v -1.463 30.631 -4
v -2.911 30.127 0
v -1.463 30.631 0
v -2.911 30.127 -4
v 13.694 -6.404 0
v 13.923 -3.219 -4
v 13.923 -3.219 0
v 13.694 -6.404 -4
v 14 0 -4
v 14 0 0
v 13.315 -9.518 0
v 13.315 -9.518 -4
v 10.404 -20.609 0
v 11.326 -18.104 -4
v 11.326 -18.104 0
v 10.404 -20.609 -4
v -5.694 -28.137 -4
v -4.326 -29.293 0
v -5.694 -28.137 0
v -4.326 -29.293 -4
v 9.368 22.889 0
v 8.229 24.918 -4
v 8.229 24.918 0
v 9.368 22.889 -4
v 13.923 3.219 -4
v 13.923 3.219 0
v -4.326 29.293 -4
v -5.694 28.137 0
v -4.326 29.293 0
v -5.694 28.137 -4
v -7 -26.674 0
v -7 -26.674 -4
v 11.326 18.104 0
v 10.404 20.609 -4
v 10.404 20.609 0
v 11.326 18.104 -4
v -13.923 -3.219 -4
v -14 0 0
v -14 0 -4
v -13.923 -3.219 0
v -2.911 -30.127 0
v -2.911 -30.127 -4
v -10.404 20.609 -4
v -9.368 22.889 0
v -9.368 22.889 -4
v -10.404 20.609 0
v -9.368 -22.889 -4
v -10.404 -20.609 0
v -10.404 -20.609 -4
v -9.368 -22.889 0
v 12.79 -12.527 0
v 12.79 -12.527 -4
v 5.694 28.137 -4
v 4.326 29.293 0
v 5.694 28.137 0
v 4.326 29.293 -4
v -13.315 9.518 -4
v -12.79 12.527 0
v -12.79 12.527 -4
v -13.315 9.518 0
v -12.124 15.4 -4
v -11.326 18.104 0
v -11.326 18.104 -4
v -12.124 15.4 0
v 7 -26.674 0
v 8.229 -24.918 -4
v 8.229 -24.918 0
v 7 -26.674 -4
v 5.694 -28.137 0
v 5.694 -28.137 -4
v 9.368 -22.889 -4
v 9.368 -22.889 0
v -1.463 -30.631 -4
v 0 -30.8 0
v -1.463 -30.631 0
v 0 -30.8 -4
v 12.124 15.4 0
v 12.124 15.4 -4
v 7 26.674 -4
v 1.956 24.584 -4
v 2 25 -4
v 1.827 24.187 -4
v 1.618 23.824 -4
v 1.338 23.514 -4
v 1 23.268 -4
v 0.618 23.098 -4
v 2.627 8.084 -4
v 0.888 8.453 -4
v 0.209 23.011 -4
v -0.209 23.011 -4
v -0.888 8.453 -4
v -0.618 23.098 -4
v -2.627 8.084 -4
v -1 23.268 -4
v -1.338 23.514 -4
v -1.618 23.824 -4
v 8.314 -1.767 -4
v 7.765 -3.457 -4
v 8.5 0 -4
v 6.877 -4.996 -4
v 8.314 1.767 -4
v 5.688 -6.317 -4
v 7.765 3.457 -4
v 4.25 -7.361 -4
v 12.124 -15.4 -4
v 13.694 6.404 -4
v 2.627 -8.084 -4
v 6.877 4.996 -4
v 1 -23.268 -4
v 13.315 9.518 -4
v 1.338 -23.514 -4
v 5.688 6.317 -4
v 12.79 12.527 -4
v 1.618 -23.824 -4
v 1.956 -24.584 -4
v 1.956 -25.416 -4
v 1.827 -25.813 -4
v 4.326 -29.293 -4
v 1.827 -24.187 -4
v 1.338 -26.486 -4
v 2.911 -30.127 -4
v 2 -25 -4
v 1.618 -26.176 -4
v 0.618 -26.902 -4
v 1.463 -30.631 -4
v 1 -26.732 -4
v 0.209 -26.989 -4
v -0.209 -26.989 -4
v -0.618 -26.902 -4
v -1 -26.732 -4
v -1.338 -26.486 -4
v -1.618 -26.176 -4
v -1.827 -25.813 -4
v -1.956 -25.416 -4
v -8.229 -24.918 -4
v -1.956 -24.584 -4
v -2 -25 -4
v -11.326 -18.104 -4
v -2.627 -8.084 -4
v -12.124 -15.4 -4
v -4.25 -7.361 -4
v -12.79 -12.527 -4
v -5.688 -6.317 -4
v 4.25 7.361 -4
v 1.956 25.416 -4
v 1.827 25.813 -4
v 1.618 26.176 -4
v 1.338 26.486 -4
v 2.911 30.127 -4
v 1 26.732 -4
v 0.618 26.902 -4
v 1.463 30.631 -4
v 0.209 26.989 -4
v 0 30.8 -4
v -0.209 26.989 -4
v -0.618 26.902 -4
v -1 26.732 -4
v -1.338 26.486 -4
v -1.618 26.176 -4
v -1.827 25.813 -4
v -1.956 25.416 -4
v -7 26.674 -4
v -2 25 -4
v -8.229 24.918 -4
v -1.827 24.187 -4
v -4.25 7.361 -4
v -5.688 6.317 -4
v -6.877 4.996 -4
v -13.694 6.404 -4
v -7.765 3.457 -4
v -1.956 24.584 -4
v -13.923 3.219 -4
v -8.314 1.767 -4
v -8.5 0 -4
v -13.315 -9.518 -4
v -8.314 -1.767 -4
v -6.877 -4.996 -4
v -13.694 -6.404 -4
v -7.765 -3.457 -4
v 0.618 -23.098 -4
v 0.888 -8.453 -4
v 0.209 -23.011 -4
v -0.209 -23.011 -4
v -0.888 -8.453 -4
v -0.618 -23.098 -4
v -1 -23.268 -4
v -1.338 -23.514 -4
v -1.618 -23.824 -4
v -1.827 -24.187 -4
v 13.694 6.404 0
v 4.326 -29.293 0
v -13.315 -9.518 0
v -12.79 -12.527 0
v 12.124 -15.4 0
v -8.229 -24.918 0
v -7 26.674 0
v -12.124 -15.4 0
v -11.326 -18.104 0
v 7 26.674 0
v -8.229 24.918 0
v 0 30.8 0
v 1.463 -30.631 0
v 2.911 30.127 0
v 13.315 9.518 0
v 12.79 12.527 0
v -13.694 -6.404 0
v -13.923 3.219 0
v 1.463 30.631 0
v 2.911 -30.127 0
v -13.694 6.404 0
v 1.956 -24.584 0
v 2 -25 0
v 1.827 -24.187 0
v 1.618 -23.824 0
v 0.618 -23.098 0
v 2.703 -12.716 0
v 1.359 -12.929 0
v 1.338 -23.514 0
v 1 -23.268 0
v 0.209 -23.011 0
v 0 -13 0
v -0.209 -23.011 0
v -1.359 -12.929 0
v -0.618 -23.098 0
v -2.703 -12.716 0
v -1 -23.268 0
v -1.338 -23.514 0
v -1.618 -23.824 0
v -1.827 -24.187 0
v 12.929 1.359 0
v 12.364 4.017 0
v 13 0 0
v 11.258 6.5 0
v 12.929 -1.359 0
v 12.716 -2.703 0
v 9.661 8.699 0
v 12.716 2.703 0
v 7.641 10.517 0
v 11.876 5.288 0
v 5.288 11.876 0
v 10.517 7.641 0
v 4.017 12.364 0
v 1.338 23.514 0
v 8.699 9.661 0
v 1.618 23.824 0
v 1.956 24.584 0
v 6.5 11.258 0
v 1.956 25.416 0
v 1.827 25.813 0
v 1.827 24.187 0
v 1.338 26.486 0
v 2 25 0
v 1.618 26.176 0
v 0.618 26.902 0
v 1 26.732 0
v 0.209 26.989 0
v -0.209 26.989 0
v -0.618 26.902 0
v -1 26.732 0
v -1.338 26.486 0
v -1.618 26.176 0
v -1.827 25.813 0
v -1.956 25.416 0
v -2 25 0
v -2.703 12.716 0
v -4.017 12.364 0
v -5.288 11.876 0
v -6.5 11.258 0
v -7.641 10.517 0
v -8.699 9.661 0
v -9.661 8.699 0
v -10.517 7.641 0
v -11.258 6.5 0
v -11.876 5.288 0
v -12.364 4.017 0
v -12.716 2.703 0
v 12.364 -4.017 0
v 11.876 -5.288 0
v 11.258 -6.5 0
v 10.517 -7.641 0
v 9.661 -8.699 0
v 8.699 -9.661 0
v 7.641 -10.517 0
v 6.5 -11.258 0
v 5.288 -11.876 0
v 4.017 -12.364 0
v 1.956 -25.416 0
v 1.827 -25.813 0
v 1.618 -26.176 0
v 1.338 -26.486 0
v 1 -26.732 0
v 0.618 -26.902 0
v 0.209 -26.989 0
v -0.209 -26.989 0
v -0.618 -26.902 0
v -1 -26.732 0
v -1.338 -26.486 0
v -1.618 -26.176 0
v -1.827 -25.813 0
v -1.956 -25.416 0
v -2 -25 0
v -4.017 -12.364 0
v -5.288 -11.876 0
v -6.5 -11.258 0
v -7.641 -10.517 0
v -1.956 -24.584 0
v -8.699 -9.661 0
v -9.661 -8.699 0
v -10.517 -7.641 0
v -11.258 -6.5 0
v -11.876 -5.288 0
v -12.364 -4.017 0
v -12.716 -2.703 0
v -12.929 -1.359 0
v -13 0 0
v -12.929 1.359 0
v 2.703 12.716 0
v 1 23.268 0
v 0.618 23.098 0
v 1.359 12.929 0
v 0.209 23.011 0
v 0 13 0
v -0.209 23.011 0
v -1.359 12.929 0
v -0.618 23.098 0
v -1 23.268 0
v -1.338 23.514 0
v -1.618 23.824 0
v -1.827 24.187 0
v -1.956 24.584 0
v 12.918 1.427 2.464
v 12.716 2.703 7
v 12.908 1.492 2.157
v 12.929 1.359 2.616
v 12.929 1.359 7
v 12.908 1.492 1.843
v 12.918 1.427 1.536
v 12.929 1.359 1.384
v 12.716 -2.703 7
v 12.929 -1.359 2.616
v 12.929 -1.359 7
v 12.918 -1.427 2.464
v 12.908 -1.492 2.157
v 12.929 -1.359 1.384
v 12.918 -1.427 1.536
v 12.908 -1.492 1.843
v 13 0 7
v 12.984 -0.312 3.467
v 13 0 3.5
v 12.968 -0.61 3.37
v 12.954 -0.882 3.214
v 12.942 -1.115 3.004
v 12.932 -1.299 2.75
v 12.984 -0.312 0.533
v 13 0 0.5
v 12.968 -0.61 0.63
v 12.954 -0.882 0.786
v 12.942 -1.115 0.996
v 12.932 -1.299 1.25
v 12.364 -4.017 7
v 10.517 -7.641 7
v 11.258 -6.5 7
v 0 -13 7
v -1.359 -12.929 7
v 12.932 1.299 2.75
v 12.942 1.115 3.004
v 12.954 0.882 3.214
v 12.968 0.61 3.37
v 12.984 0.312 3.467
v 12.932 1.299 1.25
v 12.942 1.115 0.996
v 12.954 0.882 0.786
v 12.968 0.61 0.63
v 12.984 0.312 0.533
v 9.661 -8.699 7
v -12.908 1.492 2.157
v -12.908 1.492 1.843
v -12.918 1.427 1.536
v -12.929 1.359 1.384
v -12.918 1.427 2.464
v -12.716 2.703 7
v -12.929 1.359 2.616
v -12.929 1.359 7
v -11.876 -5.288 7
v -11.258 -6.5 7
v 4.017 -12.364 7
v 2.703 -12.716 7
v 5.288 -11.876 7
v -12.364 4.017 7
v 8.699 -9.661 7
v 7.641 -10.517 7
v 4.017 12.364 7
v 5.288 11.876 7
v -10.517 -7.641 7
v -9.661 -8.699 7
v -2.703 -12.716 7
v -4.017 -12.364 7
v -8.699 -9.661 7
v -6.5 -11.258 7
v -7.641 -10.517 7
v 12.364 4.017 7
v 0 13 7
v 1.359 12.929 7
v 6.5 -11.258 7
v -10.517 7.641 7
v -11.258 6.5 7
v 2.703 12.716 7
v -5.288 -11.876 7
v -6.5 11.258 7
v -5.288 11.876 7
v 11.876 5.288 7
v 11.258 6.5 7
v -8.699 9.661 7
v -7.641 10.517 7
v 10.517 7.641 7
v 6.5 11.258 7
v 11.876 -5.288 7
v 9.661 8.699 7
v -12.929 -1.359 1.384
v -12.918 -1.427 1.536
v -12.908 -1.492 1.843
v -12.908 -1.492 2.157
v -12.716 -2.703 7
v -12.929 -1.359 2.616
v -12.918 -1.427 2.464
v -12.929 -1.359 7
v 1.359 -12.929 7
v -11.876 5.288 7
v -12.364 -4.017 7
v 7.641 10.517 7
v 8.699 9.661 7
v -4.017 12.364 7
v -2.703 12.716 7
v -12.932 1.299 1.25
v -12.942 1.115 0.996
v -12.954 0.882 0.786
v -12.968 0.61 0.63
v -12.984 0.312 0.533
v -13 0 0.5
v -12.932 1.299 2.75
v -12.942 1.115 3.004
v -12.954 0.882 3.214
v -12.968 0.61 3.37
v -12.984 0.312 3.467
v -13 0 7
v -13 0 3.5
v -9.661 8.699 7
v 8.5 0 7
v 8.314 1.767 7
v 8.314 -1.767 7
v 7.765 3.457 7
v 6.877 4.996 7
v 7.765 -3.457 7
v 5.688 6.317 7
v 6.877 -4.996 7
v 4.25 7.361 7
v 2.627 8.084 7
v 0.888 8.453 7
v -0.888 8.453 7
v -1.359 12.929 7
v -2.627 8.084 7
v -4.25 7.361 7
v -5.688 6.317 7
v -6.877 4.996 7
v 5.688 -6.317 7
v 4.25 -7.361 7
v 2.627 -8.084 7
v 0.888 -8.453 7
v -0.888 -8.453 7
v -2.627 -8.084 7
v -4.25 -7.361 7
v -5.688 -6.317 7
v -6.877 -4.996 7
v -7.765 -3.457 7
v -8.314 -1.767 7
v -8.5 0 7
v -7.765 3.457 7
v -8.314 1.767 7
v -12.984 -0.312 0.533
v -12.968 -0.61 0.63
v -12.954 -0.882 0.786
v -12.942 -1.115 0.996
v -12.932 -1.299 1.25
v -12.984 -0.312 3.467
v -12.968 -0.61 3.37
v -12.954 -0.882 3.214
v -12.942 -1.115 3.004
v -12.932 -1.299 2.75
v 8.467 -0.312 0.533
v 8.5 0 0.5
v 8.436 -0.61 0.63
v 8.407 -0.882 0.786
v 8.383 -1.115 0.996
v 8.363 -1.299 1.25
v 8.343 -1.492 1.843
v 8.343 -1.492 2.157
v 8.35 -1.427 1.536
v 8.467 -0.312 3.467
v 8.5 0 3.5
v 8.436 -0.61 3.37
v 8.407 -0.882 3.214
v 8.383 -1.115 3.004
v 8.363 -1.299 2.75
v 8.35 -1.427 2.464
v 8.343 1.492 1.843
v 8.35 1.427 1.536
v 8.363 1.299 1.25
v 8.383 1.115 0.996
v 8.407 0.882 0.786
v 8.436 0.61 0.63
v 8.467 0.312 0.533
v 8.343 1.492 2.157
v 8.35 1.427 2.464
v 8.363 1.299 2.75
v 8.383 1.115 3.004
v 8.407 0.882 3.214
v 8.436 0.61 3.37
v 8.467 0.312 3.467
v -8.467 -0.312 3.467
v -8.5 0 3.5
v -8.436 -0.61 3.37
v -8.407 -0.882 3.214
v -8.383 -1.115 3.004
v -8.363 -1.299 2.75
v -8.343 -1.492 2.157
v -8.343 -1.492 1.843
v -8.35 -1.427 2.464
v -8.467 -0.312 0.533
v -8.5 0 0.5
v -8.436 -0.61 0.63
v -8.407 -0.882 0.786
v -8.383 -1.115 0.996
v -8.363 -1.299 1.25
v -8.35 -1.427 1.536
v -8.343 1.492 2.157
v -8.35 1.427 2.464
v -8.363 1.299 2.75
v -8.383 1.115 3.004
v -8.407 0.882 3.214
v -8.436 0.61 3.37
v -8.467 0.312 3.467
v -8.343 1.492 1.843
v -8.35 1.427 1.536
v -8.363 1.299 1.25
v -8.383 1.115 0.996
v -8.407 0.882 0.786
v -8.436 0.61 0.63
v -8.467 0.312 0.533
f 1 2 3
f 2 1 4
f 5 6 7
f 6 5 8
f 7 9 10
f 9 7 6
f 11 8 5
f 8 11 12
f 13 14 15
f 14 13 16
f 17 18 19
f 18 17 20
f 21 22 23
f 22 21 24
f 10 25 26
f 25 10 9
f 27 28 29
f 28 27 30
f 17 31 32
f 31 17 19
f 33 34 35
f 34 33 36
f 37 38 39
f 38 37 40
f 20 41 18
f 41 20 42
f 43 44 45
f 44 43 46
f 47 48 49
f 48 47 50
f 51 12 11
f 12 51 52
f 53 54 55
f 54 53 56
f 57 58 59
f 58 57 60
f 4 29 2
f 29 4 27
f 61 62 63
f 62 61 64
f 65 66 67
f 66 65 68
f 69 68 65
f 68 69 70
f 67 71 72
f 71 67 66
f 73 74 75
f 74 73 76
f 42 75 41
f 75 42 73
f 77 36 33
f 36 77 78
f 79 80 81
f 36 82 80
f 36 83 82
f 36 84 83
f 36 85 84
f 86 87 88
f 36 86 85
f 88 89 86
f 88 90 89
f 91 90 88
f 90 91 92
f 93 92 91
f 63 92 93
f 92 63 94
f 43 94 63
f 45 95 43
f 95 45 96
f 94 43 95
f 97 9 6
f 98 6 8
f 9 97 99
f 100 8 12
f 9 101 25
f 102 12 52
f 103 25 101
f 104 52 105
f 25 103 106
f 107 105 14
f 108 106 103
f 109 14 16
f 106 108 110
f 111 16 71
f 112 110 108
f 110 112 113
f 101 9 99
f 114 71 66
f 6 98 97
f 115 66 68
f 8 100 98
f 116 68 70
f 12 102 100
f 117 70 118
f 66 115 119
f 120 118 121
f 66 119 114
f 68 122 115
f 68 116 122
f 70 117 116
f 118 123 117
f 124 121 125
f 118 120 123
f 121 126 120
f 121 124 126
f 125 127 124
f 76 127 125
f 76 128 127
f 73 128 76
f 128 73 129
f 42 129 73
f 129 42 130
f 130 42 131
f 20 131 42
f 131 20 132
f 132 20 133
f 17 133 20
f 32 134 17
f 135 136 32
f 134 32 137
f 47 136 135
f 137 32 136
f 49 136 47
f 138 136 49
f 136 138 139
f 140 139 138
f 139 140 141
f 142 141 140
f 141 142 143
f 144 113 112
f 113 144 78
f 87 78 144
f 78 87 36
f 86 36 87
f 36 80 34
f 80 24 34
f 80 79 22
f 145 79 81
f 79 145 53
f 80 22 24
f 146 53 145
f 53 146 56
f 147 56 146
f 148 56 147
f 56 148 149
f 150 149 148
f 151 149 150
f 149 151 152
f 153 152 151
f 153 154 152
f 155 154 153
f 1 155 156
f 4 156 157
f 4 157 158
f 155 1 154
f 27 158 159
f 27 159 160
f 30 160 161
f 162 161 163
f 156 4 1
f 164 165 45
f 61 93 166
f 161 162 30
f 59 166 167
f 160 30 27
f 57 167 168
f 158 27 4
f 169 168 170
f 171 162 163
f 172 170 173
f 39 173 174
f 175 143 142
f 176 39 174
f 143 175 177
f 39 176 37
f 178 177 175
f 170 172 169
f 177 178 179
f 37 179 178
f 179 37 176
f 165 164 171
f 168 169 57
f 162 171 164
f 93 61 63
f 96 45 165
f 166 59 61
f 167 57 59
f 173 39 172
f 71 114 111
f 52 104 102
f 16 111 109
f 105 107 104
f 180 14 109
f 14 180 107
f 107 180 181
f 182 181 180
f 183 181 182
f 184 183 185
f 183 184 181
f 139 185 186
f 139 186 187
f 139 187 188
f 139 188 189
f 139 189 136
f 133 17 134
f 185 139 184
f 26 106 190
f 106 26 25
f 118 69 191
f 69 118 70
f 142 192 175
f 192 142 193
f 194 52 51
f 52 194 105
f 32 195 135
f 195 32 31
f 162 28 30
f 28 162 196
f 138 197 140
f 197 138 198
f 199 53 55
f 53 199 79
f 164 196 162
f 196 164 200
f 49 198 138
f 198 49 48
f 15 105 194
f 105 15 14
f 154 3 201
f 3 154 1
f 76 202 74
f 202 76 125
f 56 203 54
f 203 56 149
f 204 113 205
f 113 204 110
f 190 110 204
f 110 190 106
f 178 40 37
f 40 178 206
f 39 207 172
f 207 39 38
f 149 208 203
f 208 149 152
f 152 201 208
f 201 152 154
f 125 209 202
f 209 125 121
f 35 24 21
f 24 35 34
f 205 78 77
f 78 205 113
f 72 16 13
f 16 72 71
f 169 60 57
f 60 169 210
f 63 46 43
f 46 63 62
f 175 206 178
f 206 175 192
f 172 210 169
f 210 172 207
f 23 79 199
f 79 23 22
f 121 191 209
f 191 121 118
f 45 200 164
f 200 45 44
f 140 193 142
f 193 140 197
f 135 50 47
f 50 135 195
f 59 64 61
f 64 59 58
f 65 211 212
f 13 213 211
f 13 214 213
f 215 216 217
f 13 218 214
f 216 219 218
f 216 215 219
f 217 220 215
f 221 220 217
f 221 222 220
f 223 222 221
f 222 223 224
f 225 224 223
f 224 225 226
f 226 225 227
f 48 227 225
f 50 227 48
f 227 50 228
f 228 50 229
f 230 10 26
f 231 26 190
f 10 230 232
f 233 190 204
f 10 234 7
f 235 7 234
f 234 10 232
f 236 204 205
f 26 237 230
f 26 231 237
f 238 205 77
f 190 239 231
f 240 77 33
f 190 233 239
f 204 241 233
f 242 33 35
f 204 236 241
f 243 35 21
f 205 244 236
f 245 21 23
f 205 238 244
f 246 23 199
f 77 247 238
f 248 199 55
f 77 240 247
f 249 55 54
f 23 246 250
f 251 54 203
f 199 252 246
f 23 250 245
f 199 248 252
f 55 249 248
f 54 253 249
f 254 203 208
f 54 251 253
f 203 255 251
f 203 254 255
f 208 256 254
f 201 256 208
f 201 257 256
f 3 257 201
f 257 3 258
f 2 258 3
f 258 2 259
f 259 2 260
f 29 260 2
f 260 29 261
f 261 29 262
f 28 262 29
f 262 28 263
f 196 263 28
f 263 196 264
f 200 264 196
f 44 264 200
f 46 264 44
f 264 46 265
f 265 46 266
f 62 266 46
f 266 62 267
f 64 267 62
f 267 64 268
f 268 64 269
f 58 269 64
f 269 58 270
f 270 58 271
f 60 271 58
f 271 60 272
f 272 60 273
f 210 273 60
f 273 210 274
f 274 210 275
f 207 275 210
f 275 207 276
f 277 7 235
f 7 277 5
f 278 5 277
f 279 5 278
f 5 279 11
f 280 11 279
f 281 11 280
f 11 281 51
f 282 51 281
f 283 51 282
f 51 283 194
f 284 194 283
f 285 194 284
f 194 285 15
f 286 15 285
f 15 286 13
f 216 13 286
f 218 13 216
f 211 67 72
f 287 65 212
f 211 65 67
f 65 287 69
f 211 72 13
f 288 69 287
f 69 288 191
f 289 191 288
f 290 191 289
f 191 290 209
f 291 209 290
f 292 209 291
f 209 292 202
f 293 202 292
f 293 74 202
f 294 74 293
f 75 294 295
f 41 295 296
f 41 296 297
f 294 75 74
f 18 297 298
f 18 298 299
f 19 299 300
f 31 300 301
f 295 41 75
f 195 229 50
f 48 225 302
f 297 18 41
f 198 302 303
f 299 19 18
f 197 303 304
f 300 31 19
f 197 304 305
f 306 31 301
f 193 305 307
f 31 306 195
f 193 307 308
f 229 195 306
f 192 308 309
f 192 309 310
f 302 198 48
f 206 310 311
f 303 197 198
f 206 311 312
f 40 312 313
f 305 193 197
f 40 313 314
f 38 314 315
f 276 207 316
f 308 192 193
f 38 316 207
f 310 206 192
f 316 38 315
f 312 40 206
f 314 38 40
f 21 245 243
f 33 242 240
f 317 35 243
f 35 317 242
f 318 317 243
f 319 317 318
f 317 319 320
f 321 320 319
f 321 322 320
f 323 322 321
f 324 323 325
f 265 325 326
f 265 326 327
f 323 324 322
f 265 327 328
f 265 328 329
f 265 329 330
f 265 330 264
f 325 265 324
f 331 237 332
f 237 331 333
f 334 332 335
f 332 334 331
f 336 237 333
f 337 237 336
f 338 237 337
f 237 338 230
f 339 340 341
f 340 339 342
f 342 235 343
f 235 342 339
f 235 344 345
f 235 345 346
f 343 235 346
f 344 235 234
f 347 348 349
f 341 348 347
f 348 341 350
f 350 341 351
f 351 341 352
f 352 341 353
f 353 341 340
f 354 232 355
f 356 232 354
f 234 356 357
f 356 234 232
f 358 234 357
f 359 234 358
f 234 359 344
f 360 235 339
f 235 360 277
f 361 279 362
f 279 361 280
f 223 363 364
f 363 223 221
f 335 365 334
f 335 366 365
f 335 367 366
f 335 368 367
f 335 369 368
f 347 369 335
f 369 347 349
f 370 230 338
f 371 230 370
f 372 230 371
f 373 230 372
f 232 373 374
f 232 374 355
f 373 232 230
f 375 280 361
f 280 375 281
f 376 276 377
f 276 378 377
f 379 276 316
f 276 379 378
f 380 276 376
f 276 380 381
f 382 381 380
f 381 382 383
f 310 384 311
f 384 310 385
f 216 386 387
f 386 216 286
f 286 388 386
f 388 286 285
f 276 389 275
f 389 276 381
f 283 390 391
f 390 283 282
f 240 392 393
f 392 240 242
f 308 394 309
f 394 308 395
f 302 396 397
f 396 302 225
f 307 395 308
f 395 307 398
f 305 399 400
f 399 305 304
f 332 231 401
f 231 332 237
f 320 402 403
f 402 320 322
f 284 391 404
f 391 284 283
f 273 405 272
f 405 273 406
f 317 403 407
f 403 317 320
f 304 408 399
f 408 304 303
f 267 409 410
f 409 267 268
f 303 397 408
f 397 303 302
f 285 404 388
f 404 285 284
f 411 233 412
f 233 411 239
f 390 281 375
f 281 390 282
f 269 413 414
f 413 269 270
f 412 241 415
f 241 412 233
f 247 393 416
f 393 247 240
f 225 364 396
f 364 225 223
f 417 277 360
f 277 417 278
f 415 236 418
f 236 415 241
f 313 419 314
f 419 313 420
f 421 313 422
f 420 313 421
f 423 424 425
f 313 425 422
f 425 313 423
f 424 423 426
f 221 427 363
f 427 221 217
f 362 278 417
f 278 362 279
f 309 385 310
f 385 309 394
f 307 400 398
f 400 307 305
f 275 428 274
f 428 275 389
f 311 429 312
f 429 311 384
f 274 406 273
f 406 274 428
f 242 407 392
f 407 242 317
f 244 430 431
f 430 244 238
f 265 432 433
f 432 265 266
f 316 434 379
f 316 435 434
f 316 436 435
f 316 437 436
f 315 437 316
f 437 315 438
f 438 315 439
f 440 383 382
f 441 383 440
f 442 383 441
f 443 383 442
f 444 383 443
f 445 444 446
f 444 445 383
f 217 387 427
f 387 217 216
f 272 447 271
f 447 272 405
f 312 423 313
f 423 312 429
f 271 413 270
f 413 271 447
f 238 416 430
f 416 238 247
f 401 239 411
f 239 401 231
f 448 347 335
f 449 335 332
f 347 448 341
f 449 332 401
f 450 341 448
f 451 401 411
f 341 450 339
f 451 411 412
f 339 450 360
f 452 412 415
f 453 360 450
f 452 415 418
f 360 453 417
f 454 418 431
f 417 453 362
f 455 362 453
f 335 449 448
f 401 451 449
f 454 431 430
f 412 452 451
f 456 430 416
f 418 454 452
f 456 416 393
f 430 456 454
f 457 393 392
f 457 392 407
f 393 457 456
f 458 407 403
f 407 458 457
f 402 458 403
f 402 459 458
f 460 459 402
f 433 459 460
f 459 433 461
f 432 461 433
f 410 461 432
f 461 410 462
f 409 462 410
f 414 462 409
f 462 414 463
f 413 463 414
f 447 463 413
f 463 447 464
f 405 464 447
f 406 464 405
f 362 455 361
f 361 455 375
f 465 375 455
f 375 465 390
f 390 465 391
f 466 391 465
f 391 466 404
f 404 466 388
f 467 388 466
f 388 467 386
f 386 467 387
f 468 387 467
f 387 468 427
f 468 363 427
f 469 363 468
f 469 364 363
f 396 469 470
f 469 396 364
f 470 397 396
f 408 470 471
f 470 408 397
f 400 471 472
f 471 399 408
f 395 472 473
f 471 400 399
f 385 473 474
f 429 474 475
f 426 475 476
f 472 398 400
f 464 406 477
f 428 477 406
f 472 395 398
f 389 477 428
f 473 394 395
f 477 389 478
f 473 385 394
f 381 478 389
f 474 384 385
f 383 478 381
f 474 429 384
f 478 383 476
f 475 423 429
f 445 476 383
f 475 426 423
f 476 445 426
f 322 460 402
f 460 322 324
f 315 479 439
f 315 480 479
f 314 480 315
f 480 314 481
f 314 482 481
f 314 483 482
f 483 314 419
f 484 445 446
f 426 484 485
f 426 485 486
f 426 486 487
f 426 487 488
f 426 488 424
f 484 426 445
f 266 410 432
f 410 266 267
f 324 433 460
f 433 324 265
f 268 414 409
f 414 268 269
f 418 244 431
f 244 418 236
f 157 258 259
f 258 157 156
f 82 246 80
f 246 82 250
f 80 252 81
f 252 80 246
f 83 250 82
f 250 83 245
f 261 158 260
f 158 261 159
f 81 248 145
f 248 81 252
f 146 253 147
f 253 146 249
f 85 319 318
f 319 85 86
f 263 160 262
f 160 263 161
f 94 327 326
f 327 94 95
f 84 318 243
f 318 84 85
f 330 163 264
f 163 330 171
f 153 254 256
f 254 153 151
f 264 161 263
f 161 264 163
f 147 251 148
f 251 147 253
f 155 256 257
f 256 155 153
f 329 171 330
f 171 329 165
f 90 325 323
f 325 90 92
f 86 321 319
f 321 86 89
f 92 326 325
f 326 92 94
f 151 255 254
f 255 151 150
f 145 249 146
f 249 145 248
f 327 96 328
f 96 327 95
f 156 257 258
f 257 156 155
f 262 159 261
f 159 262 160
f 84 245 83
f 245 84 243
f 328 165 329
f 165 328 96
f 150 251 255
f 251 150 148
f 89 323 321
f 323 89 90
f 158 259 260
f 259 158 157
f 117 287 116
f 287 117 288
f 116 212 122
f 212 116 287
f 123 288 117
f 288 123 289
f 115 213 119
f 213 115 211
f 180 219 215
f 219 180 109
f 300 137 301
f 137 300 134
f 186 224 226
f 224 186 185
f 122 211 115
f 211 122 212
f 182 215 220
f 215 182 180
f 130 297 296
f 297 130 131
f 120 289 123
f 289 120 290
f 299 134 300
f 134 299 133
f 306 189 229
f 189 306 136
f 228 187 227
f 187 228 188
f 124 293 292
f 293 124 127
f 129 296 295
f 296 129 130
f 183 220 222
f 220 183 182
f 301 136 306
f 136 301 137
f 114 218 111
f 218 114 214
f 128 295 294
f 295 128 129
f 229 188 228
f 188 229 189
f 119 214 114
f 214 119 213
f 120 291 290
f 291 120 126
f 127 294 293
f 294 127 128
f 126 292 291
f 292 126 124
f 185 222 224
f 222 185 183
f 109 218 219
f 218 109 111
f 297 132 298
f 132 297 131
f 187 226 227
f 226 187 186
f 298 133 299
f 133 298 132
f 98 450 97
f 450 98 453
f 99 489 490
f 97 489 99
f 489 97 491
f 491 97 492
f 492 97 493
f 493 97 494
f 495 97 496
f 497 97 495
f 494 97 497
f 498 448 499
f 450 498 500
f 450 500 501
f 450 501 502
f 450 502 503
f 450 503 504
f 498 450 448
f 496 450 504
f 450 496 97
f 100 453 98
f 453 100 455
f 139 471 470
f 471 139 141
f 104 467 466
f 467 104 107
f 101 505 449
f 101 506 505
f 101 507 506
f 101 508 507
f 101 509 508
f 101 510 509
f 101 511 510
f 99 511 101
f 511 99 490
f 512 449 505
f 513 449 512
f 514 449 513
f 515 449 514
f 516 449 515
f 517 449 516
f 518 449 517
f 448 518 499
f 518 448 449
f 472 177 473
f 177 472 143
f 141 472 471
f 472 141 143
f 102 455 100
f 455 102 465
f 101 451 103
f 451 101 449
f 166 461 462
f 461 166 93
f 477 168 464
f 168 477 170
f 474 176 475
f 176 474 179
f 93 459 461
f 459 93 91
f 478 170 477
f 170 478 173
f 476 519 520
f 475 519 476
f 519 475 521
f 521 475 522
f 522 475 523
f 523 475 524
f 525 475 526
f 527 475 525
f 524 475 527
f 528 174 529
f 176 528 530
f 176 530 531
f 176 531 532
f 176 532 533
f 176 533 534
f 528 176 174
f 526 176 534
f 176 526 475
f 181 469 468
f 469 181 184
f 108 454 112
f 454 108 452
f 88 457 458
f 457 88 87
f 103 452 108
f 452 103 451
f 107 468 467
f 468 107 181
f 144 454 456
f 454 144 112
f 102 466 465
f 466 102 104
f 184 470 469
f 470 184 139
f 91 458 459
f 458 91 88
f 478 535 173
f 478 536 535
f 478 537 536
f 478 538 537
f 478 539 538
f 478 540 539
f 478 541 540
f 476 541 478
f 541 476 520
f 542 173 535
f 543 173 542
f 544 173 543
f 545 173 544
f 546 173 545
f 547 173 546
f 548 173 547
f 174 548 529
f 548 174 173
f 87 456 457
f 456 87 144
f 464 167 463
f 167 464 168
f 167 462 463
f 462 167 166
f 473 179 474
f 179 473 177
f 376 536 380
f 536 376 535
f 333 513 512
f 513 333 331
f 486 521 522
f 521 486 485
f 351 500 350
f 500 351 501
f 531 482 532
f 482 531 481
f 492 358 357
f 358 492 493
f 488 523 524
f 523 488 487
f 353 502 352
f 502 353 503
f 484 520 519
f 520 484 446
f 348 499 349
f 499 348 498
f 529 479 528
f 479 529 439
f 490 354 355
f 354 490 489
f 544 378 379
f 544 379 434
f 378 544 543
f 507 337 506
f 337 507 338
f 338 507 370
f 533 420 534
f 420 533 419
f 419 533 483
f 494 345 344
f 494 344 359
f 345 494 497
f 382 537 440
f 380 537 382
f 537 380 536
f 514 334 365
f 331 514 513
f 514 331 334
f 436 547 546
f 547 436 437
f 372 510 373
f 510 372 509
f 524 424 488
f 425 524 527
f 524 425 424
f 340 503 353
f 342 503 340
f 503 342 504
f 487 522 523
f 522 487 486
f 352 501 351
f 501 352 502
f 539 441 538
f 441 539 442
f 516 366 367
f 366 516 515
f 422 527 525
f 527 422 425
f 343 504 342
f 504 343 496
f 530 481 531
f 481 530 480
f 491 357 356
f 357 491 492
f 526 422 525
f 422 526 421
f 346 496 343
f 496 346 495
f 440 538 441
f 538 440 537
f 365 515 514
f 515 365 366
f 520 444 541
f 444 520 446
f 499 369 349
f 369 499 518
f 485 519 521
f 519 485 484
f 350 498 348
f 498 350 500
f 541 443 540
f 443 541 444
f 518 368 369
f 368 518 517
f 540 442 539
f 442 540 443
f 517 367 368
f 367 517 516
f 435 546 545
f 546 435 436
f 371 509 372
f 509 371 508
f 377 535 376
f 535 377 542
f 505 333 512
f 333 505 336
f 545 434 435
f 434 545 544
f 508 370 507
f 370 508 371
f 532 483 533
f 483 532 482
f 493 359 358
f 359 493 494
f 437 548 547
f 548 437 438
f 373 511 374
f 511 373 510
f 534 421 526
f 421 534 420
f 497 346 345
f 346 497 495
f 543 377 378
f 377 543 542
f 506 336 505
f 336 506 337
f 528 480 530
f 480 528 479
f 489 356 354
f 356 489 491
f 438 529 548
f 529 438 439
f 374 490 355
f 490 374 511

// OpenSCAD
//FabLab Santander
//machine "cubo"
//licence creative common 






//profile:
profilex_length=500;
profiley_length=500;
profile_size=20;
profile_screw_D=5;
//bearing:
bearing_D=22;
bearing_dint=7;
bearing_th=7;

//distance between the 2 guides x
inter_guides_x=profiley_length/2+10+bearing_th/2;
echo("distance between the 2 guides x:",2*inter_guides_x,"mm");
//x trail:
dx_guidey=60;//distance between the 2 guides y
dz_guidey=profile_size/2+bearing_D/2-1.5;//profile_size-0.5;
//x trail plate:
xtrailPlateThickness=3;
//head:
headPlateThickness=5;
headPlate_dx=dx_guidey-profile_size-2;
headPlate_dy=80;

//stepper motor nema17:
motNema17Side=42;
motNema17Dep=47.65;
motNema17AxisD=5;
motNema17AxisL=26;
motNema17ScrewFixD=3;
motNema17ScrewsDist=31;
motNema17FrontD=22;
motNema17FrontH=1.5;
//motor pulley GT2
pulleyTeethDiameter=12;
pulleyDiameter=16;
pulleyThickness=16;
//belts:
belt_th=6;//belt thickness
belt_thi=2;//belt thickness
z_belts=3;
//half distance between pulley in y direction
inter_pulleys_y=profiley_length*0.46;
//head plateform parameters:
head_bearing_axis_z=profile_size/2+bearing_D/2-1.5;


head_X=50;
head_Y=0;



//the CUBE machine mounted:
//ensemble();

//TO 3D PRINT:
//rotate([-90,0,0])xtrailPlate();
//bearingPusher();
//bearingAdaptor(); 
//stepper_holder();
//pulley_holder();
//rotate([180,0,0])head_plateform();
//rotate([-90,0,0])head_bearing_holder();
//pulley_washer();
rotate([180,0,0])extruderHolder();

//dim cube:
thickness_panel = 10;
cube_length_x = profilex_length+2*thickness_panel;
cube_length_y = profiley_length+2*profile_size;
h_stop_extruder = 120;
height_cube = profilex_length+h_stop_extruder+2*thickness_panel;



module ensemble()
{
//the clothes of the machine:
//cover();


translate([profilex_length/2,0,0]) provisory_side_plate();
mirror([1,0,0])translate([profilex_length/2,0,0]) provisory_side_plate();

	
//guides for x translation
for (i=[-1,1])translate([-profilex_length/2,i*(-profiley_length/2-10-bearing_th/2),0])rotate([0,90,0])color([0.2,0.2,0.2])import ("profil_ratrig_500mm.stl");

//guides for y translation
translate([head_X,0,0])//Y carriage ensemble
{
for (i=[-1,1])
    {
    //guides y
    translate([i*-dx_guidey/2,profiley_length/2,dz_guidey])rotate([90,0,0])color([0.2,0.2,0.2])import ("profil_ratrig_500mm.stl");
    //bearings:
    for (j=[-1,1]) translate([i*-dx_guidey/2,j*(profiley_length/2+bearing_th/2+10),dz_guidey])rotate([90,0,0])
        {
        bearing();
        bearingAdaptor();    
        }
    //screw for bearings:
     color([0.4,0.4,0.4])for (j=[-1,1])translate([i*-dx_guidey/2,j*(profiley_length/2+10),dz_guidey])rotate([90,0,0])cylinder(r=profile_screw_D/2,h=20,$fn=30,center=true);
    }
	 
//lower bearings 
for (j=[-1,1]) translate([0,j*(profiley_length/2+bearing_th/2+10),-dz_guidey])
	{
	rotate([90,0,0])bearing();
	rotate([90,0,0])bearingAdaptor();    
	//screw for bearings:
	color([0.4,0.4,0.4])translate([0,-profile_size/2,0])rotate([90,0,0])cylinder(r=profile_screw_D/2,h=30,$fn=30,center=true);
   }		 
	 
//xtrail side plates:
translate([0,profiley_length/2+xtrailPlateThickness/2,dz_guidey+profile_size/2])
	{
	xtrailPlate();
	bearingPusher();
	}
mirror([0,1,0]) translate([0,profiley_length/2+xtrailPlateThickness/2,dz_guidey+profile_size/2])
	{
	xtrailPlate();
	bearingPusher();
	}
  
//head:
translate([0,head_Y,dz_guidey])
	{
	//bearings
	 for (x=[-1,1]) for (y=[-1,1]) translate([x*dx_guidey/2,y*headPlate_dy*0.4,head_bearing_axis_z])rotate([0,0,90]) rotate([90,0,0])bearing();
	 for (x=[-1,1])  translate([x*dx_guidey/2,0,-head_bearing_axis_z])rotate([0,0,90]) rotate([90,0,0])bearing();
	//head plateform:
	head_plateform();
	//head bearings holder (with springs to push down the bearings
	for (y=[-1,1])translate([0,y*headPlate_dy*0.44,head_bearing_axis_z])head_bearing_holder();
	 // extuder:    
	//prusa i2 extruder:
	//translate([0,0,headPlateThickness])color("blue")rotate([0,0,0])import("extruder.stl");  
	//extruder head alone:
	color("gray")translate([0,0,5])extruder();  
	
	color([0.2,0.3,0.2,0.8])translate([0,0,5])extruderHolder();
	}

//pulleys fixed on the Y guides:
for (x=[-1,1])for (y=[-1,1])translate([-x*dx_guidey/2,y*(profiley_length*0.45-bearing_D),z_belts]) 
		{
		bearing();
		translate([0,0,-bearing_th])pulley_washer();
		}
}//end of X carriage ensemble

translate([0,0,z_belts])
{

for (c=[0,1]) mirror([0,c,0])
	{
	//stepper holder:
	translate([-profilex_length/2+motNema17Side/2,inter_pulleys_y,-17])stepper_holder();
	//pulley holder:
	translate([profilex_length*0.47,-inter_guides_x-profile_size/2,-17])pulley_holder();
	}

for (y=[-1,1])
	{
	//stepper motors:
	translate([-profilex_length/2+motNema17Side/2,y*inter_pulleys_y,-17])rotate([0,-90,0])color("skyblue")motor_nema17();
	//GT2 pulleys on steppers:
	color("grey")translate([-profilex_length/2+motNema17Side/2,y*inter_pulleys_y,-pulleyThickness*0.7]) pulley();//bearing();
	//pulleys on the other side:
	translate([profilex_length*0.47,y*inter_pulleys_y,0]) bearing();
	}
	
	//pulleys on the other side:
	for (c=[0,1]) mirror([0,c,0])translate([profilex_length*0.42,inter_pulleys_y-20,0]) bearing();
	
	


//belt at right
color("blue")for (c=[0,1]) mirror([0,c,0])translate([profilex_length*0.47+bearing_D/2,inter_pulleys_y*0.05,-belt_th/2])rotate([2,0,0])cube([belt_thi,inter_pulleys_y*1.9,belt_th],center=true);
//belts:
for (y=[-1,1])
	{
	color("blue")translate([-profilex_length/2+motNema17Side/2,y*(inter_pulleys_y+bearing_D/2),-belt_th/2])cube([inter_pulleys_y*2,belt_thi,belt_th]);
	color("blue")translate([-profilex_length/2+motNema17Side/2,y*(inter_pulleys_y-bearing_D/2),-belt_th/2])cube([profiley_length/2,belt_thi,belt_th]);
	color("blue")translate([head_X+dx_guidey/2,y*(inter_pulleys_y-bearing_D/2),-belt_th/2])cube([profiley_length/2-head_X-dx_guidey,belt_thi,belt_th]);
	}
//belts on the x rail:
color("blue")for (x=[-1,1]) translate([head_X-x*dx_guidey/2+x*bearing_D/2,-inter_pulleys_y+bearing_D,-belt_th/2])cube([belt_thi,inter_pulleys_y*2-bearing_D*2,belt_th]);

}

}


module head_plateform()
{
//bearing holders size:	
aay=36;
aax=5;
aaz=28;
coefy=0.44;
coefx=0.35;
difference()
	{
	union()
		{
		//main base:
		translate([-headPlate_dx/2,-headPlate_dy/2,0]) cube([headPlate_dx,  headPlate_dy,headPlateThickness]);
		//bearings holders:
		//for (x=[-1,1]) for (y=[-1,1]) translate([x*(headPlate_dx-aax)*0.5-aax/2,y*headPlate_dy*0.4-aay/2,0])cube([aax,aay,aaz]);
		//lower bearing holders:
		for (x=[-1,1])  translate([x*(headPlate_dx-aax)*0.5-aax/2,-aay/2,-aaz])cube([aax,aay,aaz]);
		//reinforcement for lower bearing axis:	
		//for (x=[-1,1])  translate([x*headPlate_dx*0.55,0,-head_bearing_axis_z]) rotate([0,90,0])cylinder(r=18/2,h=9,$fn=20,center=true);
		for (x=[-1,1])  translate([x*headPlate_dx*0.55,0,-head_bearing_axis_z]) cube([9,36,17],center=true);	
		//reinforcement for upper bearings pushers:		
		for (x=[-1,1])for (y=[-1,1])translate([headPlate_dx*coefx*x,y*headPlate_dy*coefy,-4])cylinder(r=7/2,h=8,$fn=20,center=false);	
		
		}
	//big hole:
	translate([0,0,-1])scale([1,1.4,1])cylinder(r=14,h=50,$fn=30);
	//holes to fix the extruder:
	for (y=[-1,1])translate([0,25*y,-1])cylinder(r=2,h=50,$fn=30);
	//holes for the bearings pushers
	for (x=[-1,1])for (y=[-1,1])translate([headPlate_dx*coefx*x,y*headPlate_dy*coefy,0])cylinder(r=4/2,h=headPlate_dx+2,$fn=20,center=true);	
	//holes for bearing axis:	
	for (x=[-1,1])  translate([x*dx_guidey/2,0,-head_bearing_axis_z]) rotate([0,90,0])cylinder(r=2,h=40,$fn=20,center=true);
	//belt place:
	for (v=[-1,0])mirror([v,0,0])translate([-dx_guidey/2+bearing_D/2-0,0,-dz_guidey+z_belts])cube([belt_thi*2+1,40,belt_th+2],center=true);
	//holes for belt pressing:
	for (v=[-1,0])mirror([v,0,0])for (y=[-1,1])  translate([-dx_guidey/2,13*y,-dz_guidey+z_belts]) rotate([0,90,0])cylinder(r=2.5/2,h=40,$fn=20,center=true);
	//chamfer:
	for (v=[-1,0])mirror([0,v,0])translate([0,0,-head_bearing_axis_z*1.65])rotate([10,0,0])cube([headPlate_dx*2,headPlate_dy,headPlate_dx/3],center=true);
	}
}




//head lower bearing holder:
module head_bearing_holder()
{
coefx=0.35;
difference()
	{
	union()
		{
	//body
	translate([0,0,-2])cube([dx_guidey-bearing_th-2,  8,12],center=true);
	translate([0,0,-6])cube([dx_guidey-profile_size-2,  8,12],center=true);
		}
	//space for springs:
	translate([0,0,4])cube([dx_guidey-bearing_th-14,  8+2,12],center=true);
	
	//holes for spring screws:
	for (x=[-1,1])translate([headPlate_dx*coefx*x,0,0])cylinder(r=3.5/2,h=headPlate_dx+2,$fn=20,center=true);		
	//holes for bearings screws:
	for (x=[-1,1])translate([headPlate_dx*coefx*x,0,0])rotate([0,90,0])cylinder(r=4/2,h=headPlate_dx+2,$fn=20,center=true);		
	
	}
}
	
	
//stepper motor holder:
module stepper_holder()
{
difference()
	{
	//main plate
	translate([-motNema17Side/2,-motNema17Side/2,0])cube([motNema17Side,65,4]);
	//place for the stepper head:
	translate([0,0,-1])cylinder(r=(motNema17FrontD+1)/2,h=20,$fn=30);
	//holes to fix on the rails with M5 screws:
	for (x=[-1,1]) translate([10*x,33.5,-1])cylinder(r=5/2,h=20,$fn=30);
	//hole to fix the stepper motor nema17
	for (x=[-1,1])for (y=[-1,1])translate([motNema17ScrewsDist/2*x,motNema17ScrewsDist/2*y,-1])cylinder(r=3.5/2,h=20,$fn=30);
	}
}
	
	
	
//pulley holder:
module pulley_holder()
{
ax=20;
ay=50;
difference()
	{
	//main plate
	translate([-ax/2,0,0])cube([ax,ay,4]);
	//hole for the pulley axis:
	translate([0,inter_guides_x+profile_size/2-inter_pulleys_y,-1])cylinder(r=(5)/2,h=20,$fn=30);
	//holes to fix on the rails with M5 screws:
	for (x=[-1,1]) translate([5*x,profile_size/2,-1])cylinder(r=5/2,h=20,$fn=30);
	}
}
	
	
	
	
module xtrailPlate()
{
xtrailPlate_dz=profile_size;
a=profile_size;
dy=a;
difference()
	{
	union()
		{
		//plate to attach the 2 y profiles:
		translate([-(dx_guidey+profile_size)/2,-xtrailPlateThickness/2,-xtrailPlate_dz]) cube([dx_guidey+profile_size,xtrailPlateThickness,xtrailPlate_dz]);
		//plate that connects the lower bearing:
		translate([-(profile_size)/2,-xtrailPlateThickness/2,-xtrailPlate_dz*1.7]) cube([a,xtrailPlateThickness,xtrailPlate_dz]);
		//rounded plate:
		translate([0,xtrailPlateThickness/2,-xtrailPlate_dz*1.6])  rotate([90,0,0]) cylinder(h=xtrailPlateThickness,r=xtrailPlate_dz*0.5,$fn=70);
		//vertical reinforcement:
		translate([-xtrailPlateThickness/2,-a*0.3,-a*1.8]) cube([xtrailPlateThickness,a*0.3,a*1.8]);
		//horizontal reinforcement:
		translate([-(dx_guidey-profile_size-2)/2,-a*0.3,-xtrailPlateThickness]) cube([dx_guidey-profile_size-2,a*0.3,xtrailPlateThickness]);
		// screw pressing holder: 
		translate([0,-a+xtrailPlateThickness/2,-a*1.6])translate([-a/4,0,-a/2]) cube([a/2,a,a/2]);
	  	}
    //holes
	translate([0,0,-dz_guidey-a/2])
        for (i=[-1,1]) for (k=[-1,1])translate([i*-dx_guidey/2,0,k*dz_guidey])rotate([90,0,0])cylinder(r=       profile_screw_D/2,h=40,$fn=20,center=true);
	// screw pressing holder: 
	translate([0,-a+xtrailPlateThickness/2,-a*1.6])
		{
		translate([-a/8,-a/2,-a/2-1]) cube([a/4,profile_size,a/2+2]);
		//hole for rotation axis:
		translate([-a/4-1,a/4,-a/4]) rotate([0,90,0]) cylinder(r=2.5/2,h=a/2+2,$fn=20);
		}
	//hole for pressing screw:
	translate([0,a*-0.1,-a*2.5])cylinder(r=2.5/2,h=a,$fn=20);
	}
    
}



module bearingPusher()
{
a=profile_size;
translate([0,0,1])
difference()
	{
	union()
		{
		//hold the axis screw:
		translate([-(a*0.2)/2,-a,-a*2.75]) cube([a*0.2,a/2,a*1.1]);   
		//hold the bearing screw:
		translate([-a/2/2,-a,-a*2.75]) cube([a/2,a/2*2.7,a*0.5]);   
		}
	//hole/space for pressing screw
	translate([0,a*-0.1,-a*3])cylinder(r=5/2,h=a,$fn=20);
	//hole for rotation axis:
	translate([-a*0.5,-a*0.675,-a*1.9])rotate([0,90,0])cylinder(r=3.5/2,h=a,$fn=20);
	//hole threaded to fix the bearing axis:
	translate([0,a*1.9,-a*2.5])rotate([90,0,0])cylinder(r=4.8/2,h=2*a,$fn=20);
		
	}
	
}


/**
hold the 3D printing extruder:
*/
module extruderHolder()
{
dx=25;
dy=58;
d_extruder=16;
difference()
	{
	union()
		{
		scale([1,2.2,1])cylinder(r=14,h=4,$fn=60);
		translate([0,0,-7])cylinder(r=13,h=7,$fn=60);
		}
	//translate([-dx/2,-dy/2,0]) cube([dx,dy,5]);
	//holes to fix to the head:
	for (y=[-1,1])translate([0,25*y,-10])cylinder(r=2,h=50,$fn=30);
	//hole for the extruder to go through:
	translate([0,0,-20])cylinder(r=(d_extruder+1)/2,h=30,$fn=30);
	//hole to press the extruder:
	translate([0,0,-2])rotate([0,90,0])cylinder(r=(3)/2,h=30,$fn=30,center=true);
	
	}
}





//windows cube:
module cover()
{
    difference(){      
ensemble_cube();
translate([0,0,-height_cube/2+h_stop_extruder])      
        union(){ 
cube([2*cube_length_x,cube_length_y-cube_length_x*2/5,+height_cube*3/5],center=true);     
rotate([0,0,90])
translate([-cube_length_x/2,0,0])    
cube([cube_length_x,cube_length_y-cube_length_x*2/5,height_cube*3/5],center=true);
rotate([0,90,0])
translate([-cube_length_x/2,0,0])    
cube([cube_length_x,cube_length_y-cube_length_x*1/4,height_cube*3/5],center=true);
        }   
    }
 }


module ensemble_cube()
{
//upper panel:
color("orange")
translate ([-cube_length_x/2,-cube_length_y/2-thickness_panel,h_stop_extruder-thickness_panel])
cube([cube_length_x,cube_length_y+2*thickness_panel,thickness_panel]);
//bottom panel:
color("orange")
translate ([-cube_length_x/2,-cube_length_y/2-thickness_panel,-height_cube+h_stop_extruder])
cube([cube_length_x,cube_length_y+2*thickness_panel,thickness_panel]);
//left panel:
color("orange")
translate ([cube_length_x/2-thickness_panel,-cube_length_y/2-thickness_panel,-height_cube+h_stop_extruder+thickness_panel])
cube([thickness_panel,cube_length_y+thickness_panel,height_cube-2*thickness_panel]); 
//right panel (Left mirrored):
mirror(0,1,0){
color("orange")
translate ([cube_length_x/2-thickness_panel,-cube_length_y/2-thickness_panel,-height_cube+h_stop_extruder+thickness_panel])
cube([thickness_panel,cube_length_y+thickness_panel,height_cube-2*thickness_panel]);
}    
//back panel:
color("orange")
translate ([-cube_length_x/2,cube_length_y/2,-height_cube+h_stop_extruder+thickness_panel])
cube([cube_length_x,thickness_panel,height_cube-10*thickness_panel]);
//front panel:
color("cyan")
translate ([-cube_length_x/2,-cube_length_y/2-2*thickness_panel,-height_cube+h_stop_extruder])
cube([cube_length_x,thickness_panel,height_cube]);
//tirador puerta:
color("black")
translate([cube_length_x/2-50,-cube_length_y/2-3*thickness_panel,-height_cube/2+h_stop_extruder])
sphere(r=12.5,$fn=20);

}



/*
plates use to test the X Y system:
*/
module provisory_side_plate()
{
h=100;
dy=profiley_length+50;
color("orange")
difference()
	{
	translate ([0,-dy/2,-h+20]) cube([thickness_panel,dy,h]);
	for (y=[-1,1])translate ([profilex_length*0.3,y*(inter_guides_x),0])rotate([0,90,0])cylinder(h=200,r=5/2,$fn=20);
	}
}






module bearingAdaptor()
{
 color("pink")
translate([0,0,-bearing_th/2])
difference()
    {
    cylinder(r=bearing_dint/2,h=bearing_th,$fn=20);
    translate([0,0,-1])cylinder(r=profile_screw_D/2,h=bearing_th+2,$fn=20);  
    }   
}



// bearing
module bearing()
{
color([0.8,0.8,0.8])
translate([0,0,-bearing_th/2])
difference()
    {
    cylinder(r=bearing_D/2,h=bearing_th);
    translate([0,0,-1])cylinder(r=bearing_dint/2,h=bearing_th+2);  
    }
}

module pulley()
{
difference()
   {
	union()
		{
		cylinder(r=pulleyDiameter/2,h=pulleyThickness/2); 
		translate([0,0,pulleyThickness*0.5])cylinder(r=pulleyTeethDiameter/2,h=pulleyThickness/2,$fn=30); 
		translate([0,0,pulleyThickness*0.9])cylinder(r=pulleyDiameter/2,h=pulleyThickness*0.1); 
		}
    translate([0,0,-1])	cylinder(r=motNema17AxisD/2,h=pulleyThickness+2,$fn=30); 
		n=20;
	for (a=[0:n-1]) rotate([0,0,a*360/n]) translate([pulleyTeethDiameter*0.5,0,pulleyThickness*0.7]) cube([2,1,pulleyThickness*0.4],center=true);
    }
}


module pulley_washer()
{
difference()
   {
	union()
		{
		cylinder(r=(bearing_D+8)/2,h=2,$fn=60); 
		cylinder(r=(bearing_dint+2)/2,h=3,$fn=60); 
		}
	translate([0,0,-1])	cylinder(r=(5)/2,h=4+2,$fn=30); 
	}
}


module motor_nema17()
{
//moteur
difference()
	{
	translate([-motNema17Dep/2,0,0])	cube (size=[motNema17Dep,motNema17Side,motNema17Side],center=true);
	//screw holes:
	for(i=[-1,1])for(j=[-1,1])translate([-8,i*motNema17ScrewsDist/2,j*motNema17ScrewsDist/2]) rotate([0,90,0]) cylinder(h=10,r=1.5,$fn=10);
	}
//rehaut
rotate([0,90,0]) cylinder(h=motNema17FrontH,r=motNema17FrontD/2,center=false,$fn=20);

//axe moteur
translate([motNema17FrontH,0,0])rotate([0,90,0]) cylinder(h=motNema17AxisL,r=motNema17AxisD/2,center=false,$fn=20);

}



module extruder()
{
difference()
	{
	union()
		{
		cylinder(h=3.8,r=16/2,$fn=40);
		translate([0,0,-3.8])	cylinder(h=6,r=12/2,$fn=40);
		translate([0,0,-3.8-6+3])	cylinder(h=3,r=16/2,$fn=40);
		translate([0,0,-3.8-6+3-1.5])	cylinder(h=1.5,r=8/2,$fn=40);
		translate([0,0,-3.8-6+3-1.5-1])	cylinder(h=1,r=16/2,$fn=40);
		for (z=[0:11]) translate([0,0,-3.8-6+3-1.5-1-2.5*z])cylinder(h=1,r=22/2,$fn=40);
		translate([0,0,-3.8-6+3-1.5-1-25-18])	cylinder(h=18,r=5/2,$fn=40);
		//fan:
		translate([0,24,-24])cube([27,7,30],center=true);
		//fan holder
		translate([0,27/2,-20])cube([22,20,26],center=true);
		translate([0,5,-45])cube([16,20,11.6],center=true);
		}
	translate([0,0,-60])	cylinder(h=100,r=1.75/2,$fn=40);
	translate([0,0,-5])	cylinder(h=10,r=5/2,$fn=40);
}
	
}
